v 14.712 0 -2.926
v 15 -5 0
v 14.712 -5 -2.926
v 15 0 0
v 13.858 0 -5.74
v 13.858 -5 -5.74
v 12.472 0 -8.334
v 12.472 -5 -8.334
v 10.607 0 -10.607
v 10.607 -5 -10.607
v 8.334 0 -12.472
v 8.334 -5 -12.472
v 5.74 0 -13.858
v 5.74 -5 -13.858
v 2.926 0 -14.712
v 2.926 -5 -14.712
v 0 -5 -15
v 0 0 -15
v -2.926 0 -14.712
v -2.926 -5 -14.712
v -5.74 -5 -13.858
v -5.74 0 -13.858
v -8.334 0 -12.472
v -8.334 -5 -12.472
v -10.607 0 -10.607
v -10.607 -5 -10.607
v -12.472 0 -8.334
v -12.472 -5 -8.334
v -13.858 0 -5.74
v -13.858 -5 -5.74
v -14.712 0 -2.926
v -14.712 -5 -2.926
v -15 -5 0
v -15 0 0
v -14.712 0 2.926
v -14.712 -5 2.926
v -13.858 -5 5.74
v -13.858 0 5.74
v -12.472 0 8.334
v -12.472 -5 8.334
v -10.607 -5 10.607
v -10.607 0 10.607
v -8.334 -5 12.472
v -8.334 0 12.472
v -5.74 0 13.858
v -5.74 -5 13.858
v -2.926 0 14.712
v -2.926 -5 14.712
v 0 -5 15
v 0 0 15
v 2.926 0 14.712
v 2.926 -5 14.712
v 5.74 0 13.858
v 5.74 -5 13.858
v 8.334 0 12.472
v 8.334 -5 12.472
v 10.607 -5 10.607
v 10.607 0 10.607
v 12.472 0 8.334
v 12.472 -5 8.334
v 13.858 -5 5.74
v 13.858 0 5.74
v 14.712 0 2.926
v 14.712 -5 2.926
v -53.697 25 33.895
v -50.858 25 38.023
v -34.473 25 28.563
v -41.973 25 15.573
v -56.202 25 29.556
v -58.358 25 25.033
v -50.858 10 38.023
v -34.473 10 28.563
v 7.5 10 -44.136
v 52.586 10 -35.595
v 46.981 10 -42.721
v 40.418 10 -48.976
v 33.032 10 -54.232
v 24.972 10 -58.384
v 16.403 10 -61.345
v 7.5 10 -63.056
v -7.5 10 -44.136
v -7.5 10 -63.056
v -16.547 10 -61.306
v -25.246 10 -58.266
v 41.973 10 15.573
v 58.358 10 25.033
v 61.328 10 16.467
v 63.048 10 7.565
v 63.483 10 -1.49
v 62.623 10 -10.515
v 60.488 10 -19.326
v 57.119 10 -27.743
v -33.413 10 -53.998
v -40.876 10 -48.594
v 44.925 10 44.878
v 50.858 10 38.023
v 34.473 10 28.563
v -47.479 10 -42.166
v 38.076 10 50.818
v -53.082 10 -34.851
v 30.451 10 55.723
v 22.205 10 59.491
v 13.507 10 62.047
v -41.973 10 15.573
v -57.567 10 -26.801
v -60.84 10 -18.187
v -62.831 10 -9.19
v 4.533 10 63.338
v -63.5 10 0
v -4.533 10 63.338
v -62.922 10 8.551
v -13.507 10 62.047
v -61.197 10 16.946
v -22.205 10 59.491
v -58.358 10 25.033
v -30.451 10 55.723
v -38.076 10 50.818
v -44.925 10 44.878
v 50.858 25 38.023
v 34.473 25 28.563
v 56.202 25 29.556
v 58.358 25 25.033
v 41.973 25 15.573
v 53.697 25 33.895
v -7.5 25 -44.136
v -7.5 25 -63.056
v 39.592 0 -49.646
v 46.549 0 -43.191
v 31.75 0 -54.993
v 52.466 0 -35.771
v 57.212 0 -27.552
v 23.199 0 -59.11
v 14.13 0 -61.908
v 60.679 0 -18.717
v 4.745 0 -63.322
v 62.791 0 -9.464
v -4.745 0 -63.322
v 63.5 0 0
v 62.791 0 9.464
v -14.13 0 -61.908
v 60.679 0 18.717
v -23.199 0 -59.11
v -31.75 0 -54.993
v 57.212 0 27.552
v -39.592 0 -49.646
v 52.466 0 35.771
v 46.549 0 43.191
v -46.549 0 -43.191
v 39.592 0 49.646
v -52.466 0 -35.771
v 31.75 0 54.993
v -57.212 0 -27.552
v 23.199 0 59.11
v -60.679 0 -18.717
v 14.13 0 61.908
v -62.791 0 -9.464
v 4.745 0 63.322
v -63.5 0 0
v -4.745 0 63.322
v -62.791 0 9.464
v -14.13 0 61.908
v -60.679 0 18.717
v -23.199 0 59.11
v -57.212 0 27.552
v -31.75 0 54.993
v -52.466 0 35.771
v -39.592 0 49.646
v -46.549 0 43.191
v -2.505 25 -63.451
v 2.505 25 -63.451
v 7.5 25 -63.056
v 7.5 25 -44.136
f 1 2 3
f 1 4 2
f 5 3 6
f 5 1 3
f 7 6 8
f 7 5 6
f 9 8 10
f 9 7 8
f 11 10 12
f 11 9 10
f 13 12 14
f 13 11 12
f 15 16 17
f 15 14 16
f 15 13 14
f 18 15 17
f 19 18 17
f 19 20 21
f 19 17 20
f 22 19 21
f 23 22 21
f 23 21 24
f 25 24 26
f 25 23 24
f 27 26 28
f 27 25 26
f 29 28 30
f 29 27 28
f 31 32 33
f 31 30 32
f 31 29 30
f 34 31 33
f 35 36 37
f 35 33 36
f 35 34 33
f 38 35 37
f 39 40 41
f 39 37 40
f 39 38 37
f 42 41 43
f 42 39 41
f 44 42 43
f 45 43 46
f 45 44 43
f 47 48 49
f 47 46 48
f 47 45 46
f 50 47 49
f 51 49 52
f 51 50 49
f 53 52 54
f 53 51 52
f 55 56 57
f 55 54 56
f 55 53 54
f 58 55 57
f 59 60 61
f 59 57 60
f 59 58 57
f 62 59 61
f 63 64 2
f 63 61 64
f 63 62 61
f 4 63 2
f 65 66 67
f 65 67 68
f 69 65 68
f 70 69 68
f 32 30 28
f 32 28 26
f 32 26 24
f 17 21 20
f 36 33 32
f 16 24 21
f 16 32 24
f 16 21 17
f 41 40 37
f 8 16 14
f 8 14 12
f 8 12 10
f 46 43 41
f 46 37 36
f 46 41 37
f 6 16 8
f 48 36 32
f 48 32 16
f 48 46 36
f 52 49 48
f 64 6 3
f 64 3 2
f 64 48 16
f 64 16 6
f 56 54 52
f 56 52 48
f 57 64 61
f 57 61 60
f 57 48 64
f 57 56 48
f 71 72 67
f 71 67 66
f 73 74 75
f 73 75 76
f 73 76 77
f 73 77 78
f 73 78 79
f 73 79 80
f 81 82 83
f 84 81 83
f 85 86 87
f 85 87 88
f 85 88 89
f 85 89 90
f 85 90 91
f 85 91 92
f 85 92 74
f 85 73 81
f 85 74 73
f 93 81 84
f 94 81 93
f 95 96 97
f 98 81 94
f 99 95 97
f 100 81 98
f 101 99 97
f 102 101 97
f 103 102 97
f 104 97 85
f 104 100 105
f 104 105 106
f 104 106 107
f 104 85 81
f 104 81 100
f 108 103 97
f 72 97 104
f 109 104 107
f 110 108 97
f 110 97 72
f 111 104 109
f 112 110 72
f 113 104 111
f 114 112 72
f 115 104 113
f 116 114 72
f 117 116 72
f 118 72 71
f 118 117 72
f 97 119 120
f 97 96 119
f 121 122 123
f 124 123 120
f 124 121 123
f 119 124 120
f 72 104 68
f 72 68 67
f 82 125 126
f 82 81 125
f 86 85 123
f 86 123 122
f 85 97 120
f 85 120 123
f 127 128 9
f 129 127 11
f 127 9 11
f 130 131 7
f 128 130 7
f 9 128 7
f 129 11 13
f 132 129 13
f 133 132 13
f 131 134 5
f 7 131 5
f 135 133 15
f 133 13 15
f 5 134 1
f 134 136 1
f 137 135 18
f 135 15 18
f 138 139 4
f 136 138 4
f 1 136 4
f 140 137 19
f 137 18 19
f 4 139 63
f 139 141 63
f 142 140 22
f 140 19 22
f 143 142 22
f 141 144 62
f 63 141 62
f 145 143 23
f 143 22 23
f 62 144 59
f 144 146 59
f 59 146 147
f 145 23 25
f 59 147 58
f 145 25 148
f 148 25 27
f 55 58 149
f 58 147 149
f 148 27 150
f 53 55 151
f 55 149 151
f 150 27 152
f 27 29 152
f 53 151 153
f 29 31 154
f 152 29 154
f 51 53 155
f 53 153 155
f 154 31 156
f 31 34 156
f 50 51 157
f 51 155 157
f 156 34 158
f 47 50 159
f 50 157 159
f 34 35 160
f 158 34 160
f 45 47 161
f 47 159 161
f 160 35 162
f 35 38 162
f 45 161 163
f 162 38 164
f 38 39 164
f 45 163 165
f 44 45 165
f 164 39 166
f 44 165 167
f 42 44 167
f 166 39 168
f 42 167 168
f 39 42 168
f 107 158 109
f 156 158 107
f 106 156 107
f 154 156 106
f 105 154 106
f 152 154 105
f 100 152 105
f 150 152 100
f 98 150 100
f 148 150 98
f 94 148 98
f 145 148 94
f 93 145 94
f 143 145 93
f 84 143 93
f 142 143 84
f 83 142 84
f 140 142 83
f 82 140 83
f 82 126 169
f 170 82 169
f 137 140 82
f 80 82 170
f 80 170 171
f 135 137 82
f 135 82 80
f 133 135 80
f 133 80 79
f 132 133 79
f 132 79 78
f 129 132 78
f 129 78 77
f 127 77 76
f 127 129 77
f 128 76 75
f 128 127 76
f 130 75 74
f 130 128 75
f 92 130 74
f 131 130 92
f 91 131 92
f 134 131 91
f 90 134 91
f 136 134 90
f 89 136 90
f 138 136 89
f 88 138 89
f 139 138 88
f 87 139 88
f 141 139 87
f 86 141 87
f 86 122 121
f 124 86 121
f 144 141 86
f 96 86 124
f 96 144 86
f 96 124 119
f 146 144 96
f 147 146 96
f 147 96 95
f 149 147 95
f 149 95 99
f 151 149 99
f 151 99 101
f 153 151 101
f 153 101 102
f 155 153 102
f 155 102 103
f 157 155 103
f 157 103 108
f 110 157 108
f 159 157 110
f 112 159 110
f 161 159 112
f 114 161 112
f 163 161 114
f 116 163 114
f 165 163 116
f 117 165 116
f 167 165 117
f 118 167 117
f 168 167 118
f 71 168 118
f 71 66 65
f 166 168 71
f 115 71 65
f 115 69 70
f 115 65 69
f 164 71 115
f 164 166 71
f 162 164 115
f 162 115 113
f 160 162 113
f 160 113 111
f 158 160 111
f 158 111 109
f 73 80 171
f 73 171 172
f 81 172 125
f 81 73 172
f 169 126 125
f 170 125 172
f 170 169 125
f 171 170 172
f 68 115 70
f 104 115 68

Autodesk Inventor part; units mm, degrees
ref_plane "YZ Plane" through (0, 0, 0) normal (1, 0, 0) x (0, 1, 0)
ref_plane "XZ Plane" through (0, 0, 0) normal (0, 1, 0) x (-1, 0, 0)
ref_plane "XY Plane" through (0, 0, 0) normal (0, 0, 1) x (1, 0, 0)
sketch "Sketch1" plane through (0, 0, 0) normal (0, 1, 0) x (-1, 0, 0)
  circle A0 centre (0, 0) radius 63.5
  dimension "d0" = 127
extrude "Extrusion1" add sketch "Sketch1" along normal blind 10
sketch "Sketch2" plane through (0, 10, 0) normal (0, 1, 0) x (1, 0, 0)
  line L0 (0, 0) -> (0, 63.7295)
  circle A0 centre (0, 0) radius 63.5 projected
  line L1 (7.5, 44.1365) -> (-7.5, 44.1365)
  line L2 (-7.5, 44.1365) -> (-7.5, 64.1365)
  line L3 (-7.5, 64.1365) -> (7.5, 64.1365)
  line L4 (7.5, 64.1365) -> (7.5, 44.1365)
  line L5 (7.5, 44.1365) -> (-7.5, 64.1365) construction
  line L6 (-7.5, 44.1365) -> (7.5, 64.1365) construction
  point P0 (0, 54.1365)
  point P1 (-7.5, 63.0555)
  point P2 (7.5, 63.0555)
  dimension "d3" = 15
  dimension "d4" = 20
extrude "Extrusion2" add sketch "Sketch2" along normal blind 15 contours L1 L2 A0 L0 | L0 A0 L4 L1
pattern_circular "Circular Pattern1" count 3 over 360 about axis through (0, 0, 0) along (0, 1, 0) of "Extrusion2"
sketch "Sketch3" plane through (0, 0, 0) normal (0, -1, 0) x (1, 0, 0)
  circle A0 centre (0, 0) radius 15
  dimension "d10" = 30
extrude "Extrusion3" add sketch "Sketch3" along normal blind 5
properties part number "PM Base"
